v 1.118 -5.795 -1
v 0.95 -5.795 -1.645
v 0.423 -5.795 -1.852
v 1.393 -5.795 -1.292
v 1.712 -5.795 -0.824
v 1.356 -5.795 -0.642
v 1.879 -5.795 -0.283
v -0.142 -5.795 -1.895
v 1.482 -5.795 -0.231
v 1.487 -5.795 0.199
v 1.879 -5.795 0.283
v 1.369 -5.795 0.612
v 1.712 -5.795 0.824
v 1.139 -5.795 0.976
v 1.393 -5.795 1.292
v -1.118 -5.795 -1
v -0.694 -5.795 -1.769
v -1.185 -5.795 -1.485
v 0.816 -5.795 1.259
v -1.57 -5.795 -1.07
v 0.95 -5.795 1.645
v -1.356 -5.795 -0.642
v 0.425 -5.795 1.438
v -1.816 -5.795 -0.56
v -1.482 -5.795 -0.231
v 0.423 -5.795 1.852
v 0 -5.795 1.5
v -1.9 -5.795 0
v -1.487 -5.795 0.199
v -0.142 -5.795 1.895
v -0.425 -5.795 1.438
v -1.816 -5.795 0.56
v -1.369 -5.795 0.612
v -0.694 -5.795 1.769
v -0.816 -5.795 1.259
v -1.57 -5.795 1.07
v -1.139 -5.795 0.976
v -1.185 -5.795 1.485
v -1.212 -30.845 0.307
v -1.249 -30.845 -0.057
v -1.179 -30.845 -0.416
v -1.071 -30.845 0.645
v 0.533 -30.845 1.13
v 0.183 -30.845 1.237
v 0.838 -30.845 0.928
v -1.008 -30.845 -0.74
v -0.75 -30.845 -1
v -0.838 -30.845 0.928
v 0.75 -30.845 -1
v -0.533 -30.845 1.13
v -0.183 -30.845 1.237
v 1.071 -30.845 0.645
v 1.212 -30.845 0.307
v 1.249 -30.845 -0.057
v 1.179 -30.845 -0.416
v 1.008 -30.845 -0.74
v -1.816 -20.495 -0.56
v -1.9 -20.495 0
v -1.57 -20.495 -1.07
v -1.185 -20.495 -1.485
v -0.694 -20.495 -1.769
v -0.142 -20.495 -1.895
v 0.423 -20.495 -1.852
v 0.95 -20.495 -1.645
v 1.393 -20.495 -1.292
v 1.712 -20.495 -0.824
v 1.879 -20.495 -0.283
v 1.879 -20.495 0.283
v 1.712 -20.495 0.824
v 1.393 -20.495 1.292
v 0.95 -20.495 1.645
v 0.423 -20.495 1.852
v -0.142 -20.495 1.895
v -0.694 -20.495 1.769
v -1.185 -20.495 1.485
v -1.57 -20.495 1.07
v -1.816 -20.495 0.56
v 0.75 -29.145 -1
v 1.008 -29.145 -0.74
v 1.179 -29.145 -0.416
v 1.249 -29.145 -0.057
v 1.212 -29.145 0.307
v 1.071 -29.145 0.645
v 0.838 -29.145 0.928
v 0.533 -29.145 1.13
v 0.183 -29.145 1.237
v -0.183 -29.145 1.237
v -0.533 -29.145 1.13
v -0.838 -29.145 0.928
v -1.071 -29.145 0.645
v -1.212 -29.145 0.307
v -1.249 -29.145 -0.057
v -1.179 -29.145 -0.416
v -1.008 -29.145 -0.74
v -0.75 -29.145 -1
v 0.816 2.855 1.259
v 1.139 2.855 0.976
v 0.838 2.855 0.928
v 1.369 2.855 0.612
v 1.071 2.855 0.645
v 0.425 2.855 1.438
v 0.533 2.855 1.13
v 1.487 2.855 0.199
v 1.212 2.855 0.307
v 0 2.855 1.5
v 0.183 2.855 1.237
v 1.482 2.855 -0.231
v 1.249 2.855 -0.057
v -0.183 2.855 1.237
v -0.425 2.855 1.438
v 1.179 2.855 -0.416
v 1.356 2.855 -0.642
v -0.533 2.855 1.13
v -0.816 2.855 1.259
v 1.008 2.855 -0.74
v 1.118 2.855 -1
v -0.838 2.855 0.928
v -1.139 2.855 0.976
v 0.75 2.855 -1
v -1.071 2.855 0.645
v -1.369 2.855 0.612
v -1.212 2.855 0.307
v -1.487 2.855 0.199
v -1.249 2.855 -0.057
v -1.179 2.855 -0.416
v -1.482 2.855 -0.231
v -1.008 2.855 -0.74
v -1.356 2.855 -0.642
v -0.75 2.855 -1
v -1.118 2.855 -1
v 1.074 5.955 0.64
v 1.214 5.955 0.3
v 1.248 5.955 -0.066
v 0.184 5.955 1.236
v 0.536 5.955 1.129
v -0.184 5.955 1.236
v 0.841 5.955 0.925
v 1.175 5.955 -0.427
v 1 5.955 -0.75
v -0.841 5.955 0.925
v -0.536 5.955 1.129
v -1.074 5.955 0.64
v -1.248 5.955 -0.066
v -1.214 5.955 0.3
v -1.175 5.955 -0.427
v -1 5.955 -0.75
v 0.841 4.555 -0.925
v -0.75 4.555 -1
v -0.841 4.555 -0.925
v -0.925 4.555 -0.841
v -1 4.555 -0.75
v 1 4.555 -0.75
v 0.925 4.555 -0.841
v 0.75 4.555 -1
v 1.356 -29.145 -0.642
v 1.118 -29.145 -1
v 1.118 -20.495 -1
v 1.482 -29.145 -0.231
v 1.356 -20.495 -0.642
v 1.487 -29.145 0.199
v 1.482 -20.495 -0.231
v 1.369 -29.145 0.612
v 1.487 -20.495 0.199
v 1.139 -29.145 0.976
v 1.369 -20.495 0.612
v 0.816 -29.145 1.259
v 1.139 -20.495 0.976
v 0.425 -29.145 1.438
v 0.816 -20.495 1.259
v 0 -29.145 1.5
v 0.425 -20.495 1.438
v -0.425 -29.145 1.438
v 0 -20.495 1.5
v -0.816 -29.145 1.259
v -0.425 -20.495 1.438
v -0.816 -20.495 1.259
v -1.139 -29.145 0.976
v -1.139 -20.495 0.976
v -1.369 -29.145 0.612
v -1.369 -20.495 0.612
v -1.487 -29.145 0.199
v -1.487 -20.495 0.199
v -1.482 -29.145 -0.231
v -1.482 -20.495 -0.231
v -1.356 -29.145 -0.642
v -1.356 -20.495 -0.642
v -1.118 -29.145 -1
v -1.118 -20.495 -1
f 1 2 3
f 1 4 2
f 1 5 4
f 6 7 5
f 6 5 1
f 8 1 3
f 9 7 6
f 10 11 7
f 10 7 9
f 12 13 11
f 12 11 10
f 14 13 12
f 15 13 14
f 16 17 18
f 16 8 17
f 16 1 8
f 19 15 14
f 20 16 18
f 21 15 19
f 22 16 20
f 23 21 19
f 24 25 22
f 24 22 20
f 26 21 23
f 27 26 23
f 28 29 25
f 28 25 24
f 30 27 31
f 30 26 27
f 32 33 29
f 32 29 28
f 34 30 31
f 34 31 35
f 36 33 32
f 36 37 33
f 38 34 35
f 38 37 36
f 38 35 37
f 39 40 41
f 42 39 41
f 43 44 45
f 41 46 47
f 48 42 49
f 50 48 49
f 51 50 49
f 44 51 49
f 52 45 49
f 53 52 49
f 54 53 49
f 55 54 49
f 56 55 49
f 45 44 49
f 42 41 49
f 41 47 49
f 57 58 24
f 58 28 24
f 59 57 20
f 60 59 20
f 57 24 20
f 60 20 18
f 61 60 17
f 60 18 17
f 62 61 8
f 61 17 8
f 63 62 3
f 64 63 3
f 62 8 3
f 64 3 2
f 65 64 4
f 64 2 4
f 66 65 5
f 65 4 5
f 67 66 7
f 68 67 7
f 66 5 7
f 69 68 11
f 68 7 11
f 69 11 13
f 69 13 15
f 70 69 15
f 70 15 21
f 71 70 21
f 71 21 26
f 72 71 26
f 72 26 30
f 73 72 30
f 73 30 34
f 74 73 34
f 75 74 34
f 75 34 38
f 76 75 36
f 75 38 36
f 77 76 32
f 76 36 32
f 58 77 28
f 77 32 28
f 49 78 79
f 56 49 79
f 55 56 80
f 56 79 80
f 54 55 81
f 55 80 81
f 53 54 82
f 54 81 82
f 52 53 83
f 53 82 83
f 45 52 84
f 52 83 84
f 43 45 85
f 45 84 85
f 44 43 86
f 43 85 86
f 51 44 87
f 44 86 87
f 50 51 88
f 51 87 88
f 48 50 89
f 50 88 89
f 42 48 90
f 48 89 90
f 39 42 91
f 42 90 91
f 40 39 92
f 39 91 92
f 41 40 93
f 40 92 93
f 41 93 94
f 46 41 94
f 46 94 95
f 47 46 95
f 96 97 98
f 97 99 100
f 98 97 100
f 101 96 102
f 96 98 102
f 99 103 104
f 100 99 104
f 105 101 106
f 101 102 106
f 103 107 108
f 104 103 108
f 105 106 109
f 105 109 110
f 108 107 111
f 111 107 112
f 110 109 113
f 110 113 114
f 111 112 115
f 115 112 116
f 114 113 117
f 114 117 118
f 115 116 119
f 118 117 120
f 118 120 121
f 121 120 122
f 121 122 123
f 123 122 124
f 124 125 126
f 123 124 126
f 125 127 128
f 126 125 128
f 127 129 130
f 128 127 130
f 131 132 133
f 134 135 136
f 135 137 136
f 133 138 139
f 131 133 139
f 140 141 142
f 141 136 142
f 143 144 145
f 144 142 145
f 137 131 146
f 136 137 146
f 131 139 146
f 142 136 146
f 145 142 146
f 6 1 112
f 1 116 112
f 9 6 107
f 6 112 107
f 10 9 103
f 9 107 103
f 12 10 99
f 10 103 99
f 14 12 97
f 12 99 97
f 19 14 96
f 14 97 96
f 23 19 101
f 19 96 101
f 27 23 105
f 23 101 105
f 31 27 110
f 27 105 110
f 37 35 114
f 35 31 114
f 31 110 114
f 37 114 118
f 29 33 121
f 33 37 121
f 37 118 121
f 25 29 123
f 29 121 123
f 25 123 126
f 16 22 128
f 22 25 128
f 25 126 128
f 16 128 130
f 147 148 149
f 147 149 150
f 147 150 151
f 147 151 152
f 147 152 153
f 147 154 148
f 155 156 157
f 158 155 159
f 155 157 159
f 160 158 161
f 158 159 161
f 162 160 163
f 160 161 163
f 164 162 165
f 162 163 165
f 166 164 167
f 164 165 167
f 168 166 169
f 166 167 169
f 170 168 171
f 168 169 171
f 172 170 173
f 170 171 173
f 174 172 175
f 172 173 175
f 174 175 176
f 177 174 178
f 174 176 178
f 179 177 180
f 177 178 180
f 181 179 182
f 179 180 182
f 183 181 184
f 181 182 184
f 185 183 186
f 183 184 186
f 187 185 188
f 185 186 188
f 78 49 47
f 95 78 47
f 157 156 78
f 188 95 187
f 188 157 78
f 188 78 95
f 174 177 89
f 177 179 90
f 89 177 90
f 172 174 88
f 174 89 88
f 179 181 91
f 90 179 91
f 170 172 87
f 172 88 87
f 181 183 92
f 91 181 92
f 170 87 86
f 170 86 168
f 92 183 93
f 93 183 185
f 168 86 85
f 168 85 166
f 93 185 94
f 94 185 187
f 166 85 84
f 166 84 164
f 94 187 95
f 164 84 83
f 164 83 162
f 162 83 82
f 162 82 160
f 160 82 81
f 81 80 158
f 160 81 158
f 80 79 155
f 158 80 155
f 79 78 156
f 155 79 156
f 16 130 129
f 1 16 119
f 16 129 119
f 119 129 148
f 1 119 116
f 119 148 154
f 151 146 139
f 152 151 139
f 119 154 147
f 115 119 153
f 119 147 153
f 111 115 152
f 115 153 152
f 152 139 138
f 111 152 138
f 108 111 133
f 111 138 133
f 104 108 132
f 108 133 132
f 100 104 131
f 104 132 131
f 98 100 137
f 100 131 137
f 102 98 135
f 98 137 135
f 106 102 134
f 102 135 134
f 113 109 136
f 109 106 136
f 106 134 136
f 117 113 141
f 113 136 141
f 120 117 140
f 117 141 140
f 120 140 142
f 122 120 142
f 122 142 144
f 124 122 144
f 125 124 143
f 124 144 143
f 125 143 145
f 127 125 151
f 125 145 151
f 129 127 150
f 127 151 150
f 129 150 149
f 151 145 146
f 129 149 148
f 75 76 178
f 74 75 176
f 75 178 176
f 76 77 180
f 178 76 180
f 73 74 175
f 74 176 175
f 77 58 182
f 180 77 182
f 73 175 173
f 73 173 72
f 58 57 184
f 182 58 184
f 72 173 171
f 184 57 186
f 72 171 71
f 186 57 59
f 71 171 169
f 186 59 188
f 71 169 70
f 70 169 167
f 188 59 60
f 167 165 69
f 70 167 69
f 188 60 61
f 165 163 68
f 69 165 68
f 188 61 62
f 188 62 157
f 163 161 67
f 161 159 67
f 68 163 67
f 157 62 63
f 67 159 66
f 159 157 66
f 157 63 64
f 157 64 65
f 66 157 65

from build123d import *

# Parameters (mm, degrees)
CUT_EXTRUDE_3_REACH = 38.898
CUT_EXTRUDE_START   = -10.35
CUT_EXTRUDE_5_DEPTH = 10.35
CUT_EXTRUDE_7_DEPTH = 1.4


with BuildPart() as part:
    # 草图1 → 旋转2 (revolve)
    with BuildSketch(Plane.XY, mode=Mode.PRIVATE) as revolve_2_sk:
        Polygon((1.25, 5.955283348), (0, 5.955283348), (0, -30.844716652), (1.25, -30.844716652), (1.25, -29.144716652), (1.5, -29.144716652), (1.5, -20.494716652), (1.9, -20.494716652), (1.9, -5.794716652), (1.5, -5.794716652), (1.5, 2.855283348), (1.25, 2.855283348), align=None)
    revolve(revolve_2_sk.sketch.rotate(Axis((0, 5.955283348, 0), (0, -1, 0)), 180), axis=Axis((0, 5.955283348, 0), (0, -1, 0)))

    # 切除-拉伸3: up to this face of the body (flat: up to its plane)
    cut_extrude_3_end = Plane(part.part.faces().sort_by_distance((1.846259885, -5.794716652, 0))[0])
    # 草图5 → 切除-拉伸3 (cut, up to the picked face)
    with BuildSketch(Plane(origin=(0, 5.955283348, 0), x_dir=(1, 0, 0), z_dir=(0, 1, 0)), mode=Mode.PRIVATE) as cut_extrude_3_sk1:
        with BuildLine():
            Line((-1.118033989, 1), (1.118033989, 1))
            ThreePointArc((1.118033989, 1), (0, 1.5), (-1.118033989, 1))
        make_face()
    cut_extrude_3_tool1 = split(extrude(cut_extrude_3_sk1.sketch, amount=-CUT_EXTRUDE_3_REACH, mode=Mode.PRIVATE), bisect_by=cut_extrude_3_end, keep=Keep.BOTH, mode=Mode.PRIVATE)
    add(cut_extrude_3_tool1.solids().sort_by(Axis((0, 5.955283, -1.203164), (0, -1, 0)))[0], mode=Mode.SUBTRACT)

    # 草图7 → 切除-拉伸5 (cut)
    with BuildSketch(Plane.XZ.offset(30.844716652).offset(CUT_EXTRUDE_START)):
        with BuildLine():
            Line((1.118033989, -1), (-1.118033989, -1))
            ThreePointArc((-1.118033989, -1), (0, -1.5), (1.118033989, -1))
        make_face()
    extrude(amount=CUT_EXTRUDE_5_DEPTH, mode=Mode.SUBTRACT)

    # 草图10 → 切除-拉伸7 (cut)
    with BuildSketch(Plane(origin=(0, 5.955283348, 0), x_dir=(1, 0, 0), z_dir=(0, 1, 0))):
        with BuildLine():
            Line((-1, 0.75), (1, 0.75))
            ThreePointArc((1, 0.75), (0, 1.25), (-1, 0.75))
        make_face()
    extrude(amount=-CUT_EXTRUDE_7_DEPTH, mode=Mode.SUBTRACT)


solid = part.part
